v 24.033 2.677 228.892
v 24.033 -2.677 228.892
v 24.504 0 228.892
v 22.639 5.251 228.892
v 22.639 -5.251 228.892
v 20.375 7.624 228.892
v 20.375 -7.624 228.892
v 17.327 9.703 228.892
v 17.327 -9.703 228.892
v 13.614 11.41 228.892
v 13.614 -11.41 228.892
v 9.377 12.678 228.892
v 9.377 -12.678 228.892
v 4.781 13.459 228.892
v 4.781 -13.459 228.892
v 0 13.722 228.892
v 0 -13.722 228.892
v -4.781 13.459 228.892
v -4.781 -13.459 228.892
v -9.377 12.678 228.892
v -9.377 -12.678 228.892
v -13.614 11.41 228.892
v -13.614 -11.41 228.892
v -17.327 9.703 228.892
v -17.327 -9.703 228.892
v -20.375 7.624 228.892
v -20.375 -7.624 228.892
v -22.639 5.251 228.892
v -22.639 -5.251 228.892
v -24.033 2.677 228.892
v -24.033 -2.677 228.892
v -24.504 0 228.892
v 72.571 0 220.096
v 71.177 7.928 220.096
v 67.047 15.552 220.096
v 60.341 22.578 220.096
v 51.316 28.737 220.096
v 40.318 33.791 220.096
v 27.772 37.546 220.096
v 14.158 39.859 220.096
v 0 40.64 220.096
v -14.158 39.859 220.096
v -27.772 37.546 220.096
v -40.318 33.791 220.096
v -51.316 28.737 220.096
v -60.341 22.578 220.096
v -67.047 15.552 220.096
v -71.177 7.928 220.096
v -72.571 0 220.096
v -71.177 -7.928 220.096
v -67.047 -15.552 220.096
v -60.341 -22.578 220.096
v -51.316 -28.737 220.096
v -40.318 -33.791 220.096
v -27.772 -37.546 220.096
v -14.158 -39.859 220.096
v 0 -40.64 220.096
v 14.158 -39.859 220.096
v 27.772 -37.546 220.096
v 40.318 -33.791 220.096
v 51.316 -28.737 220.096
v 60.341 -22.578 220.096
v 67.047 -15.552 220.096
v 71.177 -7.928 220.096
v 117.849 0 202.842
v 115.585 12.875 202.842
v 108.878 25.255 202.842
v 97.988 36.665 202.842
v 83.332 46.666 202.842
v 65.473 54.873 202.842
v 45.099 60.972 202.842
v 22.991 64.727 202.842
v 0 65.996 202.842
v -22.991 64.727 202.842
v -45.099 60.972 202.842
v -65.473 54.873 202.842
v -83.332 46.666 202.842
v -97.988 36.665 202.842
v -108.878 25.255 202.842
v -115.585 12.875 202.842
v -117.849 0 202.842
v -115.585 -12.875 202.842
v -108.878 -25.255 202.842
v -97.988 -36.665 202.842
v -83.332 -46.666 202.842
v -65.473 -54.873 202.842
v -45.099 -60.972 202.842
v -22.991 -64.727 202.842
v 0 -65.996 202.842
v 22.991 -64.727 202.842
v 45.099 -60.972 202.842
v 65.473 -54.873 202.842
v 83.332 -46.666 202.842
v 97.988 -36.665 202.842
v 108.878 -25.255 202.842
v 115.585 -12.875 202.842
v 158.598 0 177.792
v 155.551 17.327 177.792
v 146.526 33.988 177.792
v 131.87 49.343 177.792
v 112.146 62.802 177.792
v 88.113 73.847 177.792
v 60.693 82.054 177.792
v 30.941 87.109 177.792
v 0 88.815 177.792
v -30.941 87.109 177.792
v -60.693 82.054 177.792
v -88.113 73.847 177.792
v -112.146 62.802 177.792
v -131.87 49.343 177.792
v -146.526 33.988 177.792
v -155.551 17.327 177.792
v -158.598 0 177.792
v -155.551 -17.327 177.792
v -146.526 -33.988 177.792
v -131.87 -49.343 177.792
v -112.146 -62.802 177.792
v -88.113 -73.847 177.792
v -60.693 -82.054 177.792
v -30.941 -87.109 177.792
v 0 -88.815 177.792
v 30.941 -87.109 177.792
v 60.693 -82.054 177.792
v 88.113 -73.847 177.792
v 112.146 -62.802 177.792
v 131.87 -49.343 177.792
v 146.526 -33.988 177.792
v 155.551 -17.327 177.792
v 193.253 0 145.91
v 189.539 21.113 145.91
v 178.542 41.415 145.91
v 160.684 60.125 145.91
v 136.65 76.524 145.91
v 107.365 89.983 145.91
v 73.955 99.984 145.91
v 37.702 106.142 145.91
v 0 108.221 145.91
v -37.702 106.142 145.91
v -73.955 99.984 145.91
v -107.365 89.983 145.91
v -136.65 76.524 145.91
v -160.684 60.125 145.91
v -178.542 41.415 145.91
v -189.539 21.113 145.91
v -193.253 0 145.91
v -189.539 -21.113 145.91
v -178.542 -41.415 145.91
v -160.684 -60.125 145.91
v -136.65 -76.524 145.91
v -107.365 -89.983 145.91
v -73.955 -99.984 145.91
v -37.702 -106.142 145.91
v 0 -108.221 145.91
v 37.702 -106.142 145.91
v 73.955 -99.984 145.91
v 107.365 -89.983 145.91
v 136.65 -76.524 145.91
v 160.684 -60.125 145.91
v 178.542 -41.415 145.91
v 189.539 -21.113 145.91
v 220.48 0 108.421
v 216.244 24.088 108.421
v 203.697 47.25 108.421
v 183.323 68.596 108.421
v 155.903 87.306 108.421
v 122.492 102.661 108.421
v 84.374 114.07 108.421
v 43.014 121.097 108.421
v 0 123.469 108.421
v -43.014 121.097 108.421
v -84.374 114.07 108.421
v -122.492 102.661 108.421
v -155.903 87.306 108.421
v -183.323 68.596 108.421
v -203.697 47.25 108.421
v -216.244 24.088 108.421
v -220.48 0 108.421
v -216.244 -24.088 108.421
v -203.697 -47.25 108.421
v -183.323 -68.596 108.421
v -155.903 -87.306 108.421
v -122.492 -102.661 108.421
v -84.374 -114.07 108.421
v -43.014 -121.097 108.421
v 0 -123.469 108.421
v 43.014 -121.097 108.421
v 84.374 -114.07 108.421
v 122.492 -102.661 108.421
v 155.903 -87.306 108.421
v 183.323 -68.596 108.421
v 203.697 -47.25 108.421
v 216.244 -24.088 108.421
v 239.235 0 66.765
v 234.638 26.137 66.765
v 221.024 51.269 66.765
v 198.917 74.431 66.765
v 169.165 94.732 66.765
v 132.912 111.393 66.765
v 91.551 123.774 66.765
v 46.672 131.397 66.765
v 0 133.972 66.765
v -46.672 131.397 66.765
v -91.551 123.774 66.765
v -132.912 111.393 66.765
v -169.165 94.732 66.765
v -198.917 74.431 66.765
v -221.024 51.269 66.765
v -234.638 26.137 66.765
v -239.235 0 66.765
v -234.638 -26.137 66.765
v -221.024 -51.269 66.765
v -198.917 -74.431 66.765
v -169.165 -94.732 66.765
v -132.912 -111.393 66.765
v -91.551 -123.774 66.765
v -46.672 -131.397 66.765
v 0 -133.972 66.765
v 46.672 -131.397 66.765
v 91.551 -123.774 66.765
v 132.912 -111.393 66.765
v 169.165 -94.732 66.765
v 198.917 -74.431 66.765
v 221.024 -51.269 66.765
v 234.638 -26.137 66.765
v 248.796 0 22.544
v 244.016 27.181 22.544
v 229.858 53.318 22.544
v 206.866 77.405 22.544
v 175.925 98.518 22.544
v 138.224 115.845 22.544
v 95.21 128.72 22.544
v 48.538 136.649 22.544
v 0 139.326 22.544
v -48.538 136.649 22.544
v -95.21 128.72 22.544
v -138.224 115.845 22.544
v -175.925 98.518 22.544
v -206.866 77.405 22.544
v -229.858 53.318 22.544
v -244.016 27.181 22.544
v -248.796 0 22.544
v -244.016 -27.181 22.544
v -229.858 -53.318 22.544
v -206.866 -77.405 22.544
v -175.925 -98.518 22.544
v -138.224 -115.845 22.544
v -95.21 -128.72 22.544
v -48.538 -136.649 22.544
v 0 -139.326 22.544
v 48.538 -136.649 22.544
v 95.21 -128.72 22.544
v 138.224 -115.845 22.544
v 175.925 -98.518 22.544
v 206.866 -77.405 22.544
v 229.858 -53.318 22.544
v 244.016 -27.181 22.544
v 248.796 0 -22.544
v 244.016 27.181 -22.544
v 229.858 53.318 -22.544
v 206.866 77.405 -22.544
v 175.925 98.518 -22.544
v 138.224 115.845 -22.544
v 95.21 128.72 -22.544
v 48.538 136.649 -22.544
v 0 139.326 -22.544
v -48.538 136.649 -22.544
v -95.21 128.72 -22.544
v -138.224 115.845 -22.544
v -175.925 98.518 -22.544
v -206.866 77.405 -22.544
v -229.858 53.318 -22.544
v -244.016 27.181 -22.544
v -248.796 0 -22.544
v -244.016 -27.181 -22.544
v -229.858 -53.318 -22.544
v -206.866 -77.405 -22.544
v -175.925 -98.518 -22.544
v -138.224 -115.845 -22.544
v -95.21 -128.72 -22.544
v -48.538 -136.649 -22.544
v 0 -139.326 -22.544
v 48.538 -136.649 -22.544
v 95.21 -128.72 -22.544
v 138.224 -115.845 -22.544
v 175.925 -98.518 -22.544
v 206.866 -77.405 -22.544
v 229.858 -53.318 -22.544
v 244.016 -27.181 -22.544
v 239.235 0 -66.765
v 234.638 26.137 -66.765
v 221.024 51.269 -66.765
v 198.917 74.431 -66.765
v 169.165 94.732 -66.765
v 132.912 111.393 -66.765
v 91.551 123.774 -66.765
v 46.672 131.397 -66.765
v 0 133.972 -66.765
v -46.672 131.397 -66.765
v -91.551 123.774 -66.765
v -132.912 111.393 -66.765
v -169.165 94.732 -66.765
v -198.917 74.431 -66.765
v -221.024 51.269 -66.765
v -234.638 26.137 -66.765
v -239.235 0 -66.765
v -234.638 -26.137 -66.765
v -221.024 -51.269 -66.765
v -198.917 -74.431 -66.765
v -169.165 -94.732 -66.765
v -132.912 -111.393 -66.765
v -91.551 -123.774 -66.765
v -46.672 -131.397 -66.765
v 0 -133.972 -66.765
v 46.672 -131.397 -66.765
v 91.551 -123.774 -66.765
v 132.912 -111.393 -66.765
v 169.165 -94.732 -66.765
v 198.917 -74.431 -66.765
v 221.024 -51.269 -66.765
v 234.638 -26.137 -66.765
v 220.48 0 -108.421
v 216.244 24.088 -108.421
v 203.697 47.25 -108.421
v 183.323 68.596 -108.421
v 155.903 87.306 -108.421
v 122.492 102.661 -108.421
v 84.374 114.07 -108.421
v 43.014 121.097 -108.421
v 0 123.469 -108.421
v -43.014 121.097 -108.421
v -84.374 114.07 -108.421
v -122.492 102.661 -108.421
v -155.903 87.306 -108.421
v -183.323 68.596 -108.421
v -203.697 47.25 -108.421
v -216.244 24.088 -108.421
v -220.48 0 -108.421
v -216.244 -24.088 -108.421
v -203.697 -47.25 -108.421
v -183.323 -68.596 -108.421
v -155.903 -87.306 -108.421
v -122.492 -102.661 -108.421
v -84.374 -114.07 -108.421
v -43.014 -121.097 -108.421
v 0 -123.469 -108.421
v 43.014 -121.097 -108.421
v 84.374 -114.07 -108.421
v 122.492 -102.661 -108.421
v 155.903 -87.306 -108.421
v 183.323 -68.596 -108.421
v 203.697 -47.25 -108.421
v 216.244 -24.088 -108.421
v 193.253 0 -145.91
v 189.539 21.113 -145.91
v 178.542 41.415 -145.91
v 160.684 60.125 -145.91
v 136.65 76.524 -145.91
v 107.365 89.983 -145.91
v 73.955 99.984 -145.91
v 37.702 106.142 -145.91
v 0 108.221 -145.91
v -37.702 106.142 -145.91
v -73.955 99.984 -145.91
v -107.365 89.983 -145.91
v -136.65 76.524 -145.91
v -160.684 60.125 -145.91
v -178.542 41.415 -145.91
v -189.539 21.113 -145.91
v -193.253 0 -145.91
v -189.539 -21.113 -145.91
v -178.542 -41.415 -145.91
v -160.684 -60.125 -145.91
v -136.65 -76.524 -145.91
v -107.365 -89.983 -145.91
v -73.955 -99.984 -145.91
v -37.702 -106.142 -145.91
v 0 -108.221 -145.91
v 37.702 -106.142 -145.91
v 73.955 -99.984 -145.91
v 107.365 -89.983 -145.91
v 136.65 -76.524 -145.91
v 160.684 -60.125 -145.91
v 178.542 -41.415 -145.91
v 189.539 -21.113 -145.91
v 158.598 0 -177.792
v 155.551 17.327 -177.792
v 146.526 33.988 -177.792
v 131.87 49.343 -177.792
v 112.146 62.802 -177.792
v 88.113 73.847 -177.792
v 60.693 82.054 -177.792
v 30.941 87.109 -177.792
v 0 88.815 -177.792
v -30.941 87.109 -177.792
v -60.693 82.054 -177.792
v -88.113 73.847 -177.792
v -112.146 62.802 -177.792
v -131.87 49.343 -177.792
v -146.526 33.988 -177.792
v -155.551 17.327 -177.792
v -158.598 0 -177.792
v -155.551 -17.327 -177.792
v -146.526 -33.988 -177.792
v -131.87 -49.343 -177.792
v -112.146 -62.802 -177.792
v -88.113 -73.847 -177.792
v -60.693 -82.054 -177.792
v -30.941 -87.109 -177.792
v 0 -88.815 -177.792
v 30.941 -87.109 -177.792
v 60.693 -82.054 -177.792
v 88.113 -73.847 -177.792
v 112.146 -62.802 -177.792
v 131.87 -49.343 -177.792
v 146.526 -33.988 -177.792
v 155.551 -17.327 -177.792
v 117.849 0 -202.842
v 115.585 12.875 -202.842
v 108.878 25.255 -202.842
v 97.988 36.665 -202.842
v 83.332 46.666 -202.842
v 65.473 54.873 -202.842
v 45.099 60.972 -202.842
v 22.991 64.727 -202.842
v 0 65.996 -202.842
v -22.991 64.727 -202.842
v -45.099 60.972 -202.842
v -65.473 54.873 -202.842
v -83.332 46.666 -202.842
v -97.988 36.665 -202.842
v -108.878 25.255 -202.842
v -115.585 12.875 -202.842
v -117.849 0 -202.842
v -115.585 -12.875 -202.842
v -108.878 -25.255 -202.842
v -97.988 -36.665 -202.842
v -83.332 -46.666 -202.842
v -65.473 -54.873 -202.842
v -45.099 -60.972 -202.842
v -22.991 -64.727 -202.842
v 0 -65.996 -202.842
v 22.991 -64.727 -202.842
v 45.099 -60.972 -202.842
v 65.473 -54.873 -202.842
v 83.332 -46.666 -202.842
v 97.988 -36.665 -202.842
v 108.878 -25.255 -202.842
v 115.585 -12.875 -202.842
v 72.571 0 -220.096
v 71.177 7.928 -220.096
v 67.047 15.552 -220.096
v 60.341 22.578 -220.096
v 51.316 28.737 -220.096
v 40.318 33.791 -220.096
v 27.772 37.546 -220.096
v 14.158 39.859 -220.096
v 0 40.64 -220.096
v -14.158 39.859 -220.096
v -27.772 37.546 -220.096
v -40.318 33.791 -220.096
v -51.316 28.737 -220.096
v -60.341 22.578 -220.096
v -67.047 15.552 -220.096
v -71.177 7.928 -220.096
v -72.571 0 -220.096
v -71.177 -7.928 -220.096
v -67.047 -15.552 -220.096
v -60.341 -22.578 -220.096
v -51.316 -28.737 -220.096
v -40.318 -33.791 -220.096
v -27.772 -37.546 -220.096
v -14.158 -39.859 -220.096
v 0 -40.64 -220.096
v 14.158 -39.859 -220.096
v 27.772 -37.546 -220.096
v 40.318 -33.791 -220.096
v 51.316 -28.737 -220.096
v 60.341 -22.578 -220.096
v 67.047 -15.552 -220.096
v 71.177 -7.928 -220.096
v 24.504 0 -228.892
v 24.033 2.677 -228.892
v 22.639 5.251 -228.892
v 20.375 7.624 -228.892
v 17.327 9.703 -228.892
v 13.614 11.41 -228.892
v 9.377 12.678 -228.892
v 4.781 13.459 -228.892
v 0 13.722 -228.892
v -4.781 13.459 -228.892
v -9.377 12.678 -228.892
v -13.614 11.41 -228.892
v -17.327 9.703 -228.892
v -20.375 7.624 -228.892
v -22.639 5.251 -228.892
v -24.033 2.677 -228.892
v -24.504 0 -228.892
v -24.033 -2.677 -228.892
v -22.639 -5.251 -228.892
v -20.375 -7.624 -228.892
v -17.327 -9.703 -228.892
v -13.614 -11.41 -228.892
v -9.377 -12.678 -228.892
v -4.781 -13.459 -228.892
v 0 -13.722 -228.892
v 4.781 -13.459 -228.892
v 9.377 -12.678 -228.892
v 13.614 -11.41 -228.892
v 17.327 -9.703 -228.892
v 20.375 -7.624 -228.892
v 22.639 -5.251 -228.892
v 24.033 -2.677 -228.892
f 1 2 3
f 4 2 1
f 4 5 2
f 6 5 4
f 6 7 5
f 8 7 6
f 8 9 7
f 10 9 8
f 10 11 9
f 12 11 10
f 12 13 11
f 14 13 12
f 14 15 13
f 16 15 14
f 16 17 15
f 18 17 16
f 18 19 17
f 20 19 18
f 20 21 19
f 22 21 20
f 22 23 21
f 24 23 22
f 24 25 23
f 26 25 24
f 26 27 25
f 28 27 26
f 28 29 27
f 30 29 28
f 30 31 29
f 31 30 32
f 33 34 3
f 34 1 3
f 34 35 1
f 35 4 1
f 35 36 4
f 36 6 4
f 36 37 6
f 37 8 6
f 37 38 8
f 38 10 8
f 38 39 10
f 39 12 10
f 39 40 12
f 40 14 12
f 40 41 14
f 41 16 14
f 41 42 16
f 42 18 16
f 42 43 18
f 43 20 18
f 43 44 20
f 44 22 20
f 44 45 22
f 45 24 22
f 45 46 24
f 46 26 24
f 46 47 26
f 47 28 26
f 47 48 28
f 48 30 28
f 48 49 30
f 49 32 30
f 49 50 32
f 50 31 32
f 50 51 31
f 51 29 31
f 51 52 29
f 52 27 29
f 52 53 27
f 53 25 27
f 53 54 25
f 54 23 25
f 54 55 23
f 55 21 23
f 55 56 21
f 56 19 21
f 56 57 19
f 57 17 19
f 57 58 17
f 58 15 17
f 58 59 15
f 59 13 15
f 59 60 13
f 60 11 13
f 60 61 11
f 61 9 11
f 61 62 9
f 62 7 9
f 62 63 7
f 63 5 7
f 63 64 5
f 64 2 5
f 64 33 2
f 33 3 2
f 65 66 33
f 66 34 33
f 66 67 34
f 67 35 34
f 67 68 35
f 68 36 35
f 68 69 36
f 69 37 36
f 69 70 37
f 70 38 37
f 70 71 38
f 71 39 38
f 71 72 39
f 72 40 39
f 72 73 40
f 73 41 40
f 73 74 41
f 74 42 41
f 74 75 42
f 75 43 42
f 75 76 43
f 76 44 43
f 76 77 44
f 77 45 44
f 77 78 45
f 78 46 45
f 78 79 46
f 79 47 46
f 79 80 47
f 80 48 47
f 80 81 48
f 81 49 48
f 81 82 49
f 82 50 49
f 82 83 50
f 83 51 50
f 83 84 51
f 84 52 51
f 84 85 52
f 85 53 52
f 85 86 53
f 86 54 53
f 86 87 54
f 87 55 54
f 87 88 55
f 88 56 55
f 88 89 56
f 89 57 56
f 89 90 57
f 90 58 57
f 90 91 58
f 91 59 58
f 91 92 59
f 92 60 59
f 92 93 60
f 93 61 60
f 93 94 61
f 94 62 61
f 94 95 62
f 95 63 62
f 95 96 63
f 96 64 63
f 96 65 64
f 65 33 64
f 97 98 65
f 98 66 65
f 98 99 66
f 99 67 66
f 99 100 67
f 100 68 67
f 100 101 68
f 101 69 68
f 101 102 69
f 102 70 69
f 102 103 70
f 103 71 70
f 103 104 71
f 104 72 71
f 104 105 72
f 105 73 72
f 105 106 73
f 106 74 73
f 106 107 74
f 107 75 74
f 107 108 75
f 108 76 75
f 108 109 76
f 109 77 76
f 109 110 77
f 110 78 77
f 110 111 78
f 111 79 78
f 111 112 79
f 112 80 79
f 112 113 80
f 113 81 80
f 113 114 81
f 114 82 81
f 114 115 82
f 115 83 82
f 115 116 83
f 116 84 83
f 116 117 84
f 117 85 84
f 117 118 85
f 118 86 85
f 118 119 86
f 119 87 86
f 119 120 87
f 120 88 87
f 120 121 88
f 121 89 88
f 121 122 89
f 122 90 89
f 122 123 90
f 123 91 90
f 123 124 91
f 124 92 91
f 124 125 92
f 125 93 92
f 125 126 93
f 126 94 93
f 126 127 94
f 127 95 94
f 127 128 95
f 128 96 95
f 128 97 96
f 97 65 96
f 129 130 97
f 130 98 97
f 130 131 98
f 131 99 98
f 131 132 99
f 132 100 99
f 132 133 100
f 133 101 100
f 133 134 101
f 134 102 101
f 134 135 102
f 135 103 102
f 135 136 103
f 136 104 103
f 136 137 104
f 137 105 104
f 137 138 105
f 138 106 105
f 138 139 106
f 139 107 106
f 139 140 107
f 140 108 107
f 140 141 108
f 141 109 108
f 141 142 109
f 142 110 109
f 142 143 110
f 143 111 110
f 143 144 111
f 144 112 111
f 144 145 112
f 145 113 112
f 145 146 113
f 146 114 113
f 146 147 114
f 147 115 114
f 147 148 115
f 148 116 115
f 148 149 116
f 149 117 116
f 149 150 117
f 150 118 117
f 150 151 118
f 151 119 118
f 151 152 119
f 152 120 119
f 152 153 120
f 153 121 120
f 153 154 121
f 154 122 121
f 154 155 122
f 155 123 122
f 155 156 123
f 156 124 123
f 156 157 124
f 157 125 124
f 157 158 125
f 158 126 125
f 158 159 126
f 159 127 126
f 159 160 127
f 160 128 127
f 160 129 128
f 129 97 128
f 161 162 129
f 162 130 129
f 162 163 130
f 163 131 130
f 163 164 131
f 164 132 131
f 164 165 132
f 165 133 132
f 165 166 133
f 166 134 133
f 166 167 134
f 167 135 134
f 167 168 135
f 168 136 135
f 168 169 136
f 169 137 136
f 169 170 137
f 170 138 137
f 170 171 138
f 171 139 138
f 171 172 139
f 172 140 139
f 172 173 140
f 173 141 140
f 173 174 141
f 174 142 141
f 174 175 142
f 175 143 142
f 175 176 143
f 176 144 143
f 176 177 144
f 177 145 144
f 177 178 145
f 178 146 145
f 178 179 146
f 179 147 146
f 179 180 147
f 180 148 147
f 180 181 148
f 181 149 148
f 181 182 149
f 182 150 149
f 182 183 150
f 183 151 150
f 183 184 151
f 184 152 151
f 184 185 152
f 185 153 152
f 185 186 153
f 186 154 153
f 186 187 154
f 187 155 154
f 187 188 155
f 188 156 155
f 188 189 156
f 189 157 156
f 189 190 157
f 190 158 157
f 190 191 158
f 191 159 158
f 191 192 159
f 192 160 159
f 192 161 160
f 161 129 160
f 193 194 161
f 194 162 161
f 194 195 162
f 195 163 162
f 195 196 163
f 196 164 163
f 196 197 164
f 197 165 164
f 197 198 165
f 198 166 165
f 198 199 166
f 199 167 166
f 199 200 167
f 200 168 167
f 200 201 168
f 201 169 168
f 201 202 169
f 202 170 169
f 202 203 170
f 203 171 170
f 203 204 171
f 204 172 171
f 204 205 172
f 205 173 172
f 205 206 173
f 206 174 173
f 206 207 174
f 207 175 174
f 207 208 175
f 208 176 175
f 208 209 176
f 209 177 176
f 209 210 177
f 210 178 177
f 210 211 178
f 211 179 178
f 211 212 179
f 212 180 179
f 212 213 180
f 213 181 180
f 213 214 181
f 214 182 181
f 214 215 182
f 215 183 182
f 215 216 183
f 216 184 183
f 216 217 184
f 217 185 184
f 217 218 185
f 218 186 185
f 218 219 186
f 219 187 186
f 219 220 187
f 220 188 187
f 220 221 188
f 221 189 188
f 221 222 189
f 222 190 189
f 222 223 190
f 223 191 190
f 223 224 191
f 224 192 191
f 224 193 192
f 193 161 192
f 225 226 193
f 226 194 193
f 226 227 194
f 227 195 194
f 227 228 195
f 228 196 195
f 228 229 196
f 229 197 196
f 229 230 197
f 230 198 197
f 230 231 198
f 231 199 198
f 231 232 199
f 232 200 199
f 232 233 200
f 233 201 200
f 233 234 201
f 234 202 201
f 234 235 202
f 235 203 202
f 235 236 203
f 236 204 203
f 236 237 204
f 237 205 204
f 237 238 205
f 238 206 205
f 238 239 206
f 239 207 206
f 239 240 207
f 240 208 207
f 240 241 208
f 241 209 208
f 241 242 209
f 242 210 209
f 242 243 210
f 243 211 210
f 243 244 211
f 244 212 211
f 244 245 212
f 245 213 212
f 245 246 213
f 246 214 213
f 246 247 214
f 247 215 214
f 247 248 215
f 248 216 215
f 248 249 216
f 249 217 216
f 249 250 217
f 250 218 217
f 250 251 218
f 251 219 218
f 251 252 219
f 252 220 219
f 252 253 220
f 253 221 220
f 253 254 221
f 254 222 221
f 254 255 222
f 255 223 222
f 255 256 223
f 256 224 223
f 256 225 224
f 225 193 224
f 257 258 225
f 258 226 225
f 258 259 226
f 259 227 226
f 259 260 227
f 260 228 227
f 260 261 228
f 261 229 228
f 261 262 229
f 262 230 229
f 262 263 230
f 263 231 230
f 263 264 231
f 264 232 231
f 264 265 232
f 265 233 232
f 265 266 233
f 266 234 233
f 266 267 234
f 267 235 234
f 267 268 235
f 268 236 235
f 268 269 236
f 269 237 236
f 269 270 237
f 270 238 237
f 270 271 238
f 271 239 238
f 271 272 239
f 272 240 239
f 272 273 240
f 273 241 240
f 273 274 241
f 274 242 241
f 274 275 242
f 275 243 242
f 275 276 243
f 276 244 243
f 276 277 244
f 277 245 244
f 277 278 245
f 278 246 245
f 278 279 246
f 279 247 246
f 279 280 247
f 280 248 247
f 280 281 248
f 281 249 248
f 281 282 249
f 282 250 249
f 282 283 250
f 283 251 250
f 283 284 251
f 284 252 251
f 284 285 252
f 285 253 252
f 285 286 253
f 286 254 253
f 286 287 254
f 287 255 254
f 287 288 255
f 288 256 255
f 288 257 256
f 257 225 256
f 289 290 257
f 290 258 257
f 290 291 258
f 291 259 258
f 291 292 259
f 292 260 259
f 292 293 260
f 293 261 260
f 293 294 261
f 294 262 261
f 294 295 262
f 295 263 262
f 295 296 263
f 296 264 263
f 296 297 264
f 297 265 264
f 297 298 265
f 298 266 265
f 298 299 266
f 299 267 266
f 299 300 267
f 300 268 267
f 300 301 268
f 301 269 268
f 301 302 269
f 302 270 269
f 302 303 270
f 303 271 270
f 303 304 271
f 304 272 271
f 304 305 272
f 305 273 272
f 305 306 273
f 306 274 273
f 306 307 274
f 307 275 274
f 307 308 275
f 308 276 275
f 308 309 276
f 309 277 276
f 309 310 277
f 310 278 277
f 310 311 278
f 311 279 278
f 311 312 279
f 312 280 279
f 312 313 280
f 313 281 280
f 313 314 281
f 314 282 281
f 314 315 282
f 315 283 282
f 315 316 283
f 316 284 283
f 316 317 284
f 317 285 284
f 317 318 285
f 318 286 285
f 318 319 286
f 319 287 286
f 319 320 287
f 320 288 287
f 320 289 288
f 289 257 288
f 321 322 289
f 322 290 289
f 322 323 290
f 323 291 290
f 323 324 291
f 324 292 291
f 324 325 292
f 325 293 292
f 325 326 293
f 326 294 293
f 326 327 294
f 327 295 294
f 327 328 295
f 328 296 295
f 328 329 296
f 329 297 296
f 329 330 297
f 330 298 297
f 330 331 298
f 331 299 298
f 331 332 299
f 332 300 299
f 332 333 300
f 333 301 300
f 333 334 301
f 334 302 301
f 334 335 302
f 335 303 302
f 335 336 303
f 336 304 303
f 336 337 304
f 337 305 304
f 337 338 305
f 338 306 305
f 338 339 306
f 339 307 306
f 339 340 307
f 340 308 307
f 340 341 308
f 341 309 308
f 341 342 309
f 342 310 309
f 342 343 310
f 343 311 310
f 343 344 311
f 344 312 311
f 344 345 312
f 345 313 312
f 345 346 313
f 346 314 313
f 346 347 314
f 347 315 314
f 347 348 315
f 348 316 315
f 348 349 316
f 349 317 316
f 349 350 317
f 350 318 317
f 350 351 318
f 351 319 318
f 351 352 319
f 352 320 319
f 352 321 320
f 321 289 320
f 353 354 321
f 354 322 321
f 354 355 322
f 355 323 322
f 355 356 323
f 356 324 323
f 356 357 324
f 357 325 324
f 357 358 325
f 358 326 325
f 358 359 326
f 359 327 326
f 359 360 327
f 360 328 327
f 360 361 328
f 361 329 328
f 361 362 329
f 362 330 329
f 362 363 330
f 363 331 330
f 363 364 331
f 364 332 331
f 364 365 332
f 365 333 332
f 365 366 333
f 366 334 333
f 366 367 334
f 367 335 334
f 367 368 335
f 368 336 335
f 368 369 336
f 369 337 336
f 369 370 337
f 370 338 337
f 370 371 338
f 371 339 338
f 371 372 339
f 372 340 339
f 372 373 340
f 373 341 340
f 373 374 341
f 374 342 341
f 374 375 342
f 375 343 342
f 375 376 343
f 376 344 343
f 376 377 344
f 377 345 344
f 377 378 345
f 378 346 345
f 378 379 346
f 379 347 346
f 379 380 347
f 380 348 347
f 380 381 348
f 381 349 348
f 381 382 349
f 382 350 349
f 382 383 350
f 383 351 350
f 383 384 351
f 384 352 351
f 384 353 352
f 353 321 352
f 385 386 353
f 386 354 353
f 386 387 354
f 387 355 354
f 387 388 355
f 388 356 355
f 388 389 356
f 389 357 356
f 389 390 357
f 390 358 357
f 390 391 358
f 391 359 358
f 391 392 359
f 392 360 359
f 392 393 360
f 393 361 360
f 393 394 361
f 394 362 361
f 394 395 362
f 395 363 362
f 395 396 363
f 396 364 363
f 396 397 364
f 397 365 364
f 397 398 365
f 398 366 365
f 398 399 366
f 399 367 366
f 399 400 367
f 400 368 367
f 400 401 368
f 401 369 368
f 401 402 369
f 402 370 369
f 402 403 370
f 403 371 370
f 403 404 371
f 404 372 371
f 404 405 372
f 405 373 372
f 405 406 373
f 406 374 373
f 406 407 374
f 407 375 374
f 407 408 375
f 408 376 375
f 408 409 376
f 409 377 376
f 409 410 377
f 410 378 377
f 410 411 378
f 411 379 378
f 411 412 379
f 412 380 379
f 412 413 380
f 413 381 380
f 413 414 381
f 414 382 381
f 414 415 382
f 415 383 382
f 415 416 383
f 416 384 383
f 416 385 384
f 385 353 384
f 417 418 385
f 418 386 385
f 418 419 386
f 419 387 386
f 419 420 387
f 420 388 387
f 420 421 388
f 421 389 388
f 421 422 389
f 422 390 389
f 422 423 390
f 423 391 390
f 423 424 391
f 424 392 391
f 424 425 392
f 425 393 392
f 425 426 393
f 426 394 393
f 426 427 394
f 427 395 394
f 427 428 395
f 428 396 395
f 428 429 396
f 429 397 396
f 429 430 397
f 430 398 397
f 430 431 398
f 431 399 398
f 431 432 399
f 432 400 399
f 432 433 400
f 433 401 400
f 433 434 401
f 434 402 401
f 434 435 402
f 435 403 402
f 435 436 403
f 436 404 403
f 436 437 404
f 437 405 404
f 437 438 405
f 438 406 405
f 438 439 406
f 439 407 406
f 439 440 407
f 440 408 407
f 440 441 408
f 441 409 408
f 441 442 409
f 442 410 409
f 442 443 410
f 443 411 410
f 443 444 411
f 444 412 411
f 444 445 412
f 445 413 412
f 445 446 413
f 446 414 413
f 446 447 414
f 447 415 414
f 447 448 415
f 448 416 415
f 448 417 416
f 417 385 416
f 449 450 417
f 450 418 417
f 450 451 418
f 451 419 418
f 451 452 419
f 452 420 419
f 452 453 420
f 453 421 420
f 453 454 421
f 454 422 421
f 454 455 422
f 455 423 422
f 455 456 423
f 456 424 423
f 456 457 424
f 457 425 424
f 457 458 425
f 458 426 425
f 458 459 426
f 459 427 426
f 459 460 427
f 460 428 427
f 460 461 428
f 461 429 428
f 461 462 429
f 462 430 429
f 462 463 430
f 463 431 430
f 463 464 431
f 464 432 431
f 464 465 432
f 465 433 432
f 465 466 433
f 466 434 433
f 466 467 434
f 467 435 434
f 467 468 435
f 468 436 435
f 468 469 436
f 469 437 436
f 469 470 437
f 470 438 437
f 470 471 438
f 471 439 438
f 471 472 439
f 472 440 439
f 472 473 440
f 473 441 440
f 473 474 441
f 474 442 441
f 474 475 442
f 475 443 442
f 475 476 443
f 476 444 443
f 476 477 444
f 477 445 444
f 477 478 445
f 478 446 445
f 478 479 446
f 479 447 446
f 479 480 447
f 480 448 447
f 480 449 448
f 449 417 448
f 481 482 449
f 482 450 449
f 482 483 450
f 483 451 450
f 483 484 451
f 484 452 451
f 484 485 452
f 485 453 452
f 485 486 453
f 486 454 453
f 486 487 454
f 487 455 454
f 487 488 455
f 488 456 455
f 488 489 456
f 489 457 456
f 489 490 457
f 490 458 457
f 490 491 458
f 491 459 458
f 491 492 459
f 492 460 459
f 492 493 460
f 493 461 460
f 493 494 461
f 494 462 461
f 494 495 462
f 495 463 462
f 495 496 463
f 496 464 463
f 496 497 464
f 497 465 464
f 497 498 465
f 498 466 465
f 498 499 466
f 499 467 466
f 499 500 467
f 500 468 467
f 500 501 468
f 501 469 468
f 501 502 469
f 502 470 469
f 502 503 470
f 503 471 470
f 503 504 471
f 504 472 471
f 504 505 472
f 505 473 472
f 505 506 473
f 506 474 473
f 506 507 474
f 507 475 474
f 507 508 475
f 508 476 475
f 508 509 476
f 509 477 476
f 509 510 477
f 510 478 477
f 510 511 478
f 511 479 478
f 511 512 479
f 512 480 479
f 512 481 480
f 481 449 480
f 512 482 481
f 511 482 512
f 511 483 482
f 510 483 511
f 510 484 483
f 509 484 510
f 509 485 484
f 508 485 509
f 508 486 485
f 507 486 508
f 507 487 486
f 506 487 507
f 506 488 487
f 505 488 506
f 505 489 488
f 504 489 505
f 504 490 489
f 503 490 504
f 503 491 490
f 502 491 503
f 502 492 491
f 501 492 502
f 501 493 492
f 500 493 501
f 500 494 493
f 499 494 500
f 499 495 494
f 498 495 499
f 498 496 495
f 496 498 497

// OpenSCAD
scale([250,140,230]) sphere(r=1, $fn=32);

//cube(size=[250,140,230]);
